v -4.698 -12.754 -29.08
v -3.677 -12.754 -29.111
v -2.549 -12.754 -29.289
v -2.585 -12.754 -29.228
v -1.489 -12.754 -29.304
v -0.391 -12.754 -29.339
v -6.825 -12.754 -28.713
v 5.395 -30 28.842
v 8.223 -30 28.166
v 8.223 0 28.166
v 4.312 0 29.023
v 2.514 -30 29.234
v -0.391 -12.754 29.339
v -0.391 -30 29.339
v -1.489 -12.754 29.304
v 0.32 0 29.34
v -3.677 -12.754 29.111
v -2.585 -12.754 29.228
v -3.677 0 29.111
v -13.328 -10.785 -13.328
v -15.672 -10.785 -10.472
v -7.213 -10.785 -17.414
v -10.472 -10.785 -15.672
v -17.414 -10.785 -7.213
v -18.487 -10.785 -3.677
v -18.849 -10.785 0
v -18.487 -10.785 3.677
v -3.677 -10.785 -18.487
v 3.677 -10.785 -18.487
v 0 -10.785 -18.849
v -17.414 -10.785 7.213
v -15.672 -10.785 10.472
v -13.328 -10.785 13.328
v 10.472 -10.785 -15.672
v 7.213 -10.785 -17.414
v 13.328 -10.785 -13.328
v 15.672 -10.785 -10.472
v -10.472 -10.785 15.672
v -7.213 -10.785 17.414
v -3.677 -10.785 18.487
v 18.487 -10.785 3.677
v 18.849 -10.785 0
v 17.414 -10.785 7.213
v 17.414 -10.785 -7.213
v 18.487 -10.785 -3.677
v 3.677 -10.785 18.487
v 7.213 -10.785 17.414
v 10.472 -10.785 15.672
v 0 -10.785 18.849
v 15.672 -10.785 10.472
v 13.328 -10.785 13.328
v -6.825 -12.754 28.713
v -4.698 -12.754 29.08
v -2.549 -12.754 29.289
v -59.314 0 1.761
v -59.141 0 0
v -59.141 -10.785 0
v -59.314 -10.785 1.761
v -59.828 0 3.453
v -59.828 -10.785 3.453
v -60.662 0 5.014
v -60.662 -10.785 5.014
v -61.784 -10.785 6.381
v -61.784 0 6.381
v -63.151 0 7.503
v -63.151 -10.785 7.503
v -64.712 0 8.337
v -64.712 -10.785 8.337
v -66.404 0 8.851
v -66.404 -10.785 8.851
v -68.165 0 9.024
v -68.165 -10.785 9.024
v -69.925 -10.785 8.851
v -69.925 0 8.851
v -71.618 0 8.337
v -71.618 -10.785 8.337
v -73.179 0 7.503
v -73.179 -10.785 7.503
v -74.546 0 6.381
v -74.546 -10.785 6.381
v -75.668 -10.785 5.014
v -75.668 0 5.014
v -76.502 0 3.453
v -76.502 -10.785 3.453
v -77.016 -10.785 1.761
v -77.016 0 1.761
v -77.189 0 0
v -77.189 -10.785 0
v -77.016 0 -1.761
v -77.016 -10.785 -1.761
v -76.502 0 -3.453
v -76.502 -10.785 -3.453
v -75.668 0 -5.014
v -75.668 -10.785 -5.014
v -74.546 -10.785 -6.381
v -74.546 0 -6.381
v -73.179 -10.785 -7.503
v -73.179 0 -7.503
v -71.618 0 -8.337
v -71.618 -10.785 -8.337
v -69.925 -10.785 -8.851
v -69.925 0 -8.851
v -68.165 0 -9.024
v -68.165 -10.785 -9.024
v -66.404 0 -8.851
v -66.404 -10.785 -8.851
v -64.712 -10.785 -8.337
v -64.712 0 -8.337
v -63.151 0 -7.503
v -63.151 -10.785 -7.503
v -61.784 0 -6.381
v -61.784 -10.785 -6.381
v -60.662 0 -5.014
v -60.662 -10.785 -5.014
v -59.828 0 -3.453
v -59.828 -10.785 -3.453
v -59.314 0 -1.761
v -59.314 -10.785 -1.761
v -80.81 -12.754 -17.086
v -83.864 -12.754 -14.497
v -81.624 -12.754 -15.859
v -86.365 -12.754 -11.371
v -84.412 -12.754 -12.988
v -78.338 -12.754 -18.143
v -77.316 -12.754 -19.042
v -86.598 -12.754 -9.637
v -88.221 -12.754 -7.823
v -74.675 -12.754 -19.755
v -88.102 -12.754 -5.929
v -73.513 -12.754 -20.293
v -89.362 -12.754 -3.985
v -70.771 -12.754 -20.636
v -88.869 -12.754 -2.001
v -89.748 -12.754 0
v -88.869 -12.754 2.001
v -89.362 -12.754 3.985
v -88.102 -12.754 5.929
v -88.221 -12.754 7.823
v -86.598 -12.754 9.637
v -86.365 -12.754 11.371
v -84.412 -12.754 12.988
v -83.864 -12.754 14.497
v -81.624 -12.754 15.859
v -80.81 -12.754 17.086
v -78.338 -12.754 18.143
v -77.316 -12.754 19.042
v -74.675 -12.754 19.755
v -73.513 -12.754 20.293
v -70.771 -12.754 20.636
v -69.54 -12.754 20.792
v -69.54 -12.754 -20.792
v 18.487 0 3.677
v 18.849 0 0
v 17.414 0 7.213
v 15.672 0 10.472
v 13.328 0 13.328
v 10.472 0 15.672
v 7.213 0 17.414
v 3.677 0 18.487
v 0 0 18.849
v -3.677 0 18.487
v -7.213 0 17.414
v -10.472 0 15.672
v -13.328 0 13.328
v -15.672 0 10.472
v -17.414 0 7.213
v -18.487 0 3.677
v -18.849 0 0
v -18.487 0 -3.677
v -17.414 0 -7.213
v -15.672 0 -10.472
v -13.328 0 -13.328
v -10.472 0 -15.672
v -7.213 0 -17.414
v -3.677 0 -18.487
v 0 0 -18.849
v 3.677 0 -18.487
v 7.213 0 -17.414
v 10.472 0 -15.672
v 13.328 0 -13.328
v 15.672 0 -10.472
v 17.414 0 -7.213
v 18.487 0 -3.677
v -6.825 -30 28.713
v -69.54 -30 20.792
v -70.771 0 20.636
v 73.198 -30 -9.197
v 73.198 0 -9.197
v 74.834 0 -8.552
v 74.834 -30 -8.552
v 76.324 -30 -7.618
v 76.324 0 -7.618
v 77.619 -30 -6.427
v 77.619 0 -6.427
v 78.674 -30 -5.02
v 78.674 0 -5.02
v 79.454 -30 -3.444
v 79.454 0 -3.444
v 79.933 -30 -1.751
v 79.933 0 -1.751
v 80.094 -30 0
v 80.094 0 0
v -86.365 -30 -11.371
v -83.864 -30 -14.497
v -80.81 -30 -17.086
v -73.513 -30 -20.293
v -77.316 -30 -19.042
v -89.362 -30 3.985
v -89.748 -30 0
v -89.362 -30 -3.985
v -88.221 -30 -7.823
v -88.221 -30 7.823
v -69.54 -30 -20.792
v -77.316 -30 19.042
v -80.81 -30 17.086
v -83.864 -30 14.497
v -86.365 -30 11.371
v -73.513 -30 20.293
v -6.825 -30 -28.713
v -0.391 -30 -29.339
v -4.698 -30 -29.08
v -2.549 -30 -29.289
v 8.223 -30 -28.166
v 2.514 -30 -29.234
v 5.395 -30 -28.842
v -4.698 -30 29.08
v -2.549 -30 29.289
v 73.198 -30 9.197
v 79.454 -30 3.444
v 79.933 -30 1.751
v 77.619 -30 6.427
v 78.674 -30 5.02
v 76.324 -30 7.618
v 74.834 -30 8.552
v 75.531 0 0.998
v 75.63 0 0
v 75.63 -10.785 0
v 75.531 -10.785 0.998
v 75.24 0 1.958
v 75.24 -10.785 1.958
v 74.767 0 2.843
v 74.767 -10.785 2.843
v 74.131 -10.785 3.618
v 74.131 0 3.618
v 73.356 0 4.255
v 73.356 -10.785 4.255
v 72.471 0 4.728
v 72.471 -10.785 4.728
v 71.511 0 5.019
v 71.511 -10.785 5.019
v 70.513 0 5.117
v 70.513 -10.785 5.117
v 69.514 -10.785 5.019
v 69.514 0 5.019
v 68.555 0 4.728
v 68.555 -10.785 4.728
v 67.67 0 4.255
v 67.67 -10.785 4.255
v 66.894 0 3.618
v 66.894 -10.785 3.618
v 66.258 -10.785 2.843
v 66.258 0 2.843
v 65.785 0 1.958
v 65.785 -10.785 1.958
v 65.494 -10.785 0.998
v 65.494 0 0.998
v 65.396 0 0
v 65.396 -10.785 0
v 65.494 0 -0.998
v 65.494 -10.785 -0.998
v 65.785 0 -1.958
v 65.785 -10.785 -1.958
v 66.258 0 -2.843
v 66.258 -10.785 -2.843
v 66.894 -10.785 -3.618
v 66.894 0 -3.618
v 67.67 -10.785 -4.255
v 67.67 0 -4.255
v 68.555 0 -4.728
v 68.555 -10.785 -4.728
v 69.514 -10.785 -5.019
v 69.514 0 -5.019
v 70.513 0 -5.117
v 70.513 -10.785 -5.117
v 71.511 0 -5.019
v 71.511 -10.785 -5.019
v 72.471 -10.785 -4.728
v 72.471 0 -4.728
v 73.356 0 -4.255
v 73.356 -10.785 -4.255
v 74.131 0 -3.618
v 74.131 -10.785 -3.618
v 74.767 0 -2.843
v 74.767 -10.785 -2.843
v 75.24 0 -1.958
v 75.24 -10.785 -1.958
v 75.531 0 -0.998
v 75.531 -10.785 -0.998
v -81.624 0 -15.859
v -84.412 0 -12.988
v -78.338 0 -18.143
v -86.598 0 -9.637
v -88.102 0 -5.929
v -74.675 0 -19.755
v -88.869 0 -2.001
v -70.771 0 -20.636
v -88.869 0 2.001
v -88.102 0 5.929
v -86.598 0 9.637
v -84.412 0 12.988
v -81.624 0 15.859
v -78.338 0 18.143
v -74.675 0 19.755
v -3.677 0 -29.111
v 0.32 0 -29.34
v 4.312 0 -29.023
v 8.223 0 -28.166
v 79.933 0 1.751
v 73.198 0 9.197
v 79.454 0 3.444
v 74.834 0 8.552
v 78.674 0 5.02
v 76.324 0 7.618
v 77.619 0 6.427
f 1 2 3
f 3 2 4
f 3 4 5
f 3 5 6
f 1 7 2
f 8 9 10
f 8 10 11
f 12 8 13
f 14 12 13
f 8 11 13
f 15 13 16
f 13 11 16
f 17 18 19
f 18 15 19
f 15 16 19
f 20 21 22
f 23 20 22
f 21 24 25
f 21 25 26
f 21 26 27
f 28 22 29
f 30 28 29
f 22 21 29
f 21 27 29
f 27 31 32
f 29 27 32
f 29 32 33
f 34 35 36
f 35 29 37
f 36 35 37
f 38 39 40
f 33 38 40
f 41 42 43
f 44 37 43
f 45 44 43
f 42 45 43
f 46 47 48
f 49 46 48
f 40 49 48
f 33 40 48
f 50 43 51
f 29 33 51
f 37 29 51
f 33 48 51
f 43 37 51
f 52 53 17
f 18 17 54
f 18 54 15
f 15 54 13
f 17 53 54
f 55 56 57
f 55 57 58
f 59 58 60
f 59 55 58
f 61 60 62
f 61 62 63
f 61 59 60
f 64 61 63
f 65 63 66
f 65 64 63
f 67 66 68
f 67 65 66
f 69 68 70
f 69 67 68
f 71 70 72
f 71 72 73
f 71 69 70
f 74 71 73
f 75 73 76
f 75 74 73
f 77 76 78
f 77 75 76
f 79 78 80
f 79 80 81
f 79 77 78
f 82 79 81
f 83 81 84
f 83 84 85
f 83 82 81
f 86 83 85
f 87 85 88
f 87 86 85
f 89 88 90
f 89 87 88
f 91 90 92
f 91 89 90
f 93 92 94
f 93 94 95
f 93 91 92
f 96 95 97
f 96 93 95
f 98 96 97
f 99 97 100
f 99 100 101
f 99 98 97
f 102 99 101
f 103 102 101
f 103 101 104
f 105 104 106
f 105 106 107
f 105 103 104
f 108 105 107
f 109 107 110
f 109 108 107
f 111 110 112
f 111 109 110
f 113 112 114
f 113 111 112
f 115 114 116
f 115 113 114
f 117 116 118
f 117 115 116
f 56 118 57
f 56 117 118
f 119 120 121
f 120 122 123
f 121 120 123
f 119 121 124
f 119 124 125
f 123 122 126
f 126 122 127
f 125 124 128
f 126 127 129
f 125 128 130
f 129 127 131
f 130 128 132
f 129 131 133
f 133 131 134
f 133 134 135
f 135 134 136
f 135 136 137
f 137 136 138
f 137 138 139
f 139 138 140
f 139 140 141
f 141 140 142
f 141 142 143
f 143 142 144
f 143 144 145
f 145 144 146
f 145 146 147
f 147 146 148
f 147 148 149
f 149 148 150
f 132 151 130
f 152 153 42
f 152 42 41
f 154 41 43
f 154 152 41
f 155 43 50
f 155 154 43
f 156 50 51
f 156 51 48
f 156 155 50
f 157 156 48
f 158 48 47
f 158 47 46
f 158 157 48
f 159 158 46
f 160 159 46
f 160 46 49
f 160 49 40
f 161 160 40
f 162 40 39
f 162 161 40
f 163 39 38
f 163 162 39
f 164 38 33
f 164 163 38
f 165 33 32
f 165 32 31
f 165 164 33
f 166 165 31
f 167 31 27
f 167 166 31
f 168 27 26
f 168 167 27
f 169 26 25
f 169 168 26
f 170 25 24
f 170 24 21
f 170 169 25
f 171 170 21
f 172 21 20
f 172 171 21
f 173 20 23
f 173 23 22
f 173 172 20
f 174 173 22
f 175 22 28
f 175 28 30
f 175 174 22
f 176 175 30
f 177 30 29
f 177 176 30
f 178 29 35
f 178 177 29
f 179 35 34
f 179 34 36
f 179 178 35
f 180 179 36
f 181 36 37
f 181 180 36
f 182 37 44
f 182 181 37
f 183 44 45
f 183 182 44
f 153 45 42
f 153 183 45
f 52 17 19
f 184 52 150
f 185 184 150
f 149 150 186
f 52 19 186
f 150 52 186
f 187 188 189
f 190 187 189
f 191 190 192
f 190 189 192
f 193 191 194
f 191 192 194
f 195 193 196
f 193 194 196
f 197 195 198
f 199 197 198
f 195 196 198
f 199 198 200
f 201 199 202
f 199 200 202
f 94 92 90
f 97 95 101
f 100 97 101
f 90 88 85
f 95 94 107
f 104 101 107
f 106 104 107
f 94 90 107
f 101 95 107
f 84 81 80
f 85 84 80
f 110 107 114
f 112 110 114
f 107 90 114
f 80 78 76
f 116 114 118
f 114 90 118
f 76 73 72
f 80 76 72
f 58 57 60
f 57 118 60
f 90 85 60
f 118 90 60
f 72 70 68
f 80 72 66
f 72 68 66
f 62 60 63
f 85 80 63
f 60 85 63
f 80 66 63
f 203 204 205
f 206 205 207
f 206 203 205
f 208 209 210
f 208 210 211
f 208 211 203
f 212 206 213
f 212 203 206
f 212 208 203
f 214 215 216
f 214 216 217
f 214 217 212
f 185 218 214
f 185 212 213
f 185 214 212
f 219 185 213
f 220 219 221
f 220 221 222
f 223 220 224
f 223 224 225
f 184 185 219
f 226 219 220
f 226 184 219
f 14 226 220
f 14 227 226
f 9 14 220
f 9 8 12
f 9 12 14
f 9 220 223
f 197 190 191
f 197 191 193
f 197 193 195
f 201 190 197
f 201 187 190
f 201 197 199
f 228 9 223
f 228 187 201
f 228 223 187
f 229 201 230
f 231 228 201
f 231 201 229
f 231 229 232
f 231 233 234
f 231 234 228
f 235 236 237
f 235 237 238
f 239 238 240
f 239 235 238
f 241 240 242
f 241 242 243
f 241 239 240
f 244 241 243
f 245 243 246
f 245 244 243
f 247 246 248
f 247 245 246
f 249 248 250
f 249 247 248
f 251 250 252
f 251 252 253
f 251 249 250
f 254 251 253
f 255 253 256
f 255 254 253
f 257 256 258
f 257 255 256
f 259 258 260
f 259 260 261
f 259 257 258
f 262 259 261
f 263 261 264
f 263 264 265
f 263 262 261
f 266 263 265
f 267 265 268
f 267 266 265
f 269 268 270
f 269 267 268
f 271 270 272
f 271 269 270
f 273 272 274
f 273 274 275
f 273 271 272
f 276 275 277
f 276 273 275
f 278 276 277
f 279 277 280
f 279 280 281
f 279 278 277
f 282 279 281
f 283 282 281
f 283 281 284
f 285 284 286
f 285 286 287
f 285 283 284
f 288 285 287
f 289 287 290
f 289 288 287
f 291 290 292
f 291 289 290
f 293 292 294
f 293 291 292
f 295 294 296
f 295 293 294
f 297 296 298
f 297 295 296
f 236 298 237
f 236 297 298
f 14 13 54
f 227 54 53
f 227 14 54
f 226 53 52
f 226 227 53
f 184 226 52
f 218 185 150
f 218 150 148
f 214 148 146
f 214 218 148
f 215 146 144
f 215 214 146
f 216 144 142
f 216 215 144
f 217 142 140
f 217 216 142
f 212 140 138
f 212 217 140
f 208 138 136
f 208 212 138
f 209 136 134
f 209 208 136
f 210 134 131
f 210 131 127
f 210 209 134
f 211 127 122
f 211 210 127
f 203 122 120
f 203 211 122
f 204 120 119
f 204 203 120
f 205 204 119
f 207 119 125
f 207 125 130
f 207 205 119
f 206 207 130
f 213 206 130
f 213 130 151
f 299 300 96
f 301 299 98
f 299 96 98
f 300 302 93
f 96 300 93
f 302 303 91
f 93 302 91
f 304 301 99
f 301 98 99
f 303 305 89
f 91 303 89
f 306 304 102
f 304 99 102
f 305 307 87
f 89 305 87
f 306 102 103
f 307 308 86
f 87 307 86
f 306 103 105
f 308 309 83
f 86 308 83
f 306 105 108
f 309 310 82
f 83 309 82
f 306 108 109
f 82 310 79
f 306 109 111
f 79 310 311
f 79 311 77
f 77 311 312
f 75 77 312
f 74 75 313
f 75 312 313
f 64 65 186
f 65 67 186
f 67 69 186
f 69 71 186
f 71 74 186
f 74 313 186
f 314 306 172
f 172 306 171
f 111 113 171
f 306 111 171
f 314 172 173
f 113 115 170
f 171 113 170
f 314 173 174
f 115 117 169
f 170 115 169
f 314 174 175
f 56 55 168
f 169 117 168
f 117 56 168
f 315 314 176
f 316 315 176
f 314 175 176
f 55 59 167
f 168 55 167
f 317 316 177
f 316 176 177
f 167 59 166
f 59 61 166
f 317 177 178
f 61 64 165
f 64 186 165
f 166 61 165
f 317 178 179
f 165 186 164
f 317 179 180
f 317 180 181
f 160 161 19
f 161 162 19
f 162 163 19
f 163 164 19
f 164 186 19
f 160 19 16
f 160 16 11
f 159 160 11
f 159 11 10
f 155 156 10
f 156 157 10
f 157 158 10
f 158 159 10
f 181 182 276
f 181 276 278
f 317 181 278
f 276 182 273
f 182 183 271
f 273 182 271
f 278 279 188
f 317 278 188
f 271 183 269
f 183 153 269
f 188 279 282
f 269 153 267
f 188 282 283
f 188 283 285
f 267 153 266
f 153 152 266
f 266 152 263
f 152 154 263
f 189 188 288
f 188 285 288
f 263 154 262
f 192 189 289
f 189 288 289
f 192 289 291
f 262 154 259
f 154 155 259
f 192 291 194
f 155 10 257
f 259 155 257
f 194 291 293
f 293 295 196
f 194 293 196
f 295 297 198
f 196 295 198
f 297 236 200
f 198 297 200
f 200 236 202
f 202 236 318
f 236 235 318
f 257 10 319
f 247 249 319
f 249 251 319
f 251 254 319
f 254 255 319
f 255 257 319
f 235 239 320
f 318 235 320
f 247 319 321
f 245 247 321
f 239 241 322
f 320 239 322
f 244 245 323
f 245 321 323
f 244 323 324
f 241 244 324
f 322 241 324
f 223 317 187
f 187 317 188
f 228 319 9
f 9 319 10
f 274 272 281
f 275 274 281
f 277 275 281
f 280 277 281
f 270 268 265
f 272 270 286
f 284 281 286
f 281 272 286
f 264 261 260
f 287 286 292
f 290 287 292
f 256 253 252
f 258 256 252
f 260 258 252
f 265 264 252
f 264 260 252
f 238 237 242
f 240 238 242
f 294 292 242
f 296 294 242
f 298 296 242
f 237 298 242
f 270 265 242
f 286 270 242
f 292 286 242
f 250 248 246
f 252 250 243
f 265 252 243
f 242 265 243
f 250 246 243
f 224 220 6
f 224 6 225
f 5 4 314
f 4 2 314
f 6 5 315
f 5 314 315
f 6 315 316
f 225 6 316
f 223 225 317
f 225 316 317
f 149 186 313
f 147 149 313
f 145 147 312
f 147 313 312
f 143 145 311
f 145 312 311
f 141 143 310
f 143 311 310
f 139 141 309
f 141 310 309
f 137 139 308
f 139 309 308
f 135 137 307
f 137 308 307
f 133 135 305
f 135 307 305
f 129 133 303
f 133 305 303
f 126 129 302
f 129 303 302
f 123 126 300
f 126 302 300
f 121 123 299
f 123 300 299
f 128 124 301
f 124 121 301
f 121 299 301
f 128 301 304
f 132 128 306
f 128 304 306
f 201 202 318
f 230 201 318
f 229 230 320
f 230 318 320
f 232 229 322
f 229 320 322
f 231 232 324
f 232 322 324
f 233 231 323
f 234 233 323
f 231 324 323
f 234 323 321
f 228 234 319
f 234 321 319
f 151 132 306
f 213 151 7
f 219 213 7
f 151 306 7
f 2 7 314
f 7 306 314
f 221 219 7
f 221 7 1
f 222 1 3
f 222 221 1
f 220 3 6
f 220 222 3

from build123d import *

# Parameters (mm, degrees)
F0_R     = 5.117058
F0_R_2   = 18.848799
F0_R_3   = 9.024126
F1_DEPTH = 30
F6_DEPTH = 10.785379
F2_R     = 20.800257
F2_R_2   = 29.342009
F2_R_3   = 9.581233
F3_DEPTH = 17.246447
F4_DEPTH = 0.934202


with BuildPart() as f1:
    # F0 (on Front) → F1 (new body)
    with BuildSketch(Plane.XZ):
        with BuildLine():
            ThreePointArc((8.222921, 28.166239), (23.475844, 17.602222), (29.342009, 0))
            ThreePointArc((29.342009, 0), (23.475844, -17.602222), (8.222921, -28.166239))
            Line((8.222921, -28.166239), (73.19784, -9.197302))
            ThreePointArc((73.19784, -9.197302), (60.931524, 0), (73.19784, 9.197302))
            Line((73.19784, 9.197302), (8.222921, 28.166239))
        make_face()
        with BuildLine():
            ThreePointArc((80.09399, 0), (78.178474, 5.747766), (73.19784, 9.197302))
            ThreePointArc((73.19784, 9.197302), (60.931524, 0), (73.19784, -9.197302))
            ThreePointArc((73.19784, -9.197302), (78.178474, -5.747766), (80.09399, 0))
        make_face()
        with Locations((70.512757, 0)):
            Circle(F0_R, mode=Mode.SUBTRACT)
        with Locations((70.512757, 0)):
            Circle(F0_R)
        with BuildLine():
            ThreePointArc((8.222921, -28.166239), (23.475844, -17.602222), (29.342009, 0))
            ThreePointArc((29.342009, 0), (23.475844, 17.602222), (8.222921, 28.166239))
            ThreePointArc((8.222921, 28.166239), (2.321575, 29.250022), (-3.676847, 29.110724))
            ThreePointArc((-3.676847, 29.110724), (-29.342009, 0), (-3.676847, -29.110724))
            ThreePointArc((-3.676847, -29.110724), (2.321575, -29.250022), (8.222921, -28.166239))
        make_face()
        Circle(F0_R_2, mode=Mode.SUBTRACT)
        Circle(F0_R_2)
        with BuildLine():
            ThreePointArc((-3.676847, -29.110724), (-29.342009, 0), (-3.676847, 29.110724))
            Line((-3.676847, 29.110724), (-70.771454, 20.636302))
            ThreePointArc((-70.771454, 20.636302), (-54.409335, 15.602342), (-47.364717, 0))
            ThreePointArc((-47.364717, 0), (-54.409335, -15.602342), (-70.771454, -20.636302))
            Line((-70.771454, -20.636302), (-3.676847, -29.110724))
        make_face()
        with BuildLine():
            ThreePointArc((-47.364717, 0), (-54.409335, 15.602342), (-70.771454, 20.636302))
            ThreePointArc((-70.771454, 20.636302), (-88.965232, 0), (-70.771454, -20.636302))
            ThreePointArc((-70.771454, -20.636302), (-54.409335, -15.602342), (-47.364717, 0))
        make_face()
        with Locations((-68.164974, 0)):
            Circle(F0_R_3, mode=Mode.SUBTRACT)
        with Locations((-68.164974, 0)):
            Circle(F0_R_3)
    extrude(amount=F1_DEPTH)

    # F0 (on Front) → F6 (cut)
    with BuildSketch(Plane.XZ):
        with Locations((-68.164974, 0)):
            Circle(F0_R_3)
        Circle(F0_R_2)
        with Locations((70.512757, 0)):
            Circle(F0_R)
    extrude(amount=F6_DEPTH, mode=Mode.SUBTRACT)

    # F2 (on offset) → F3 (join)
    with BuildSketch(Plane.XZ.offset(30)):
        with Locations((-68.947569, 0)):
            Circle(F2_R)
        with Locations((-0.782594, 0)):
            Circle(F2_R_2)
        with Locations((69.730163, 0)):
            Circle(F2_R_3)
    extrude(amount=-F3_DEPTH)

    # F0 (on Front) → F4 (cut)
    with BuildSketch(Plane.XZ):
        with BuildLine():
            ThreePointArc((-47.364717, 0), (-54.409335, 15.602342), (-70.771454, 20.636302))
            ThreePointArc((-70.771454, 20.636302), (-88.965232, 0), (-70.771454, -20.636302))
            ThreePointArc((-70.771454, -20.636302), (-54.409335, -15.602342), (-47.364717, 0))
        make_face()
        with Locations((-68.164974, 0)):
            Circle(F0_R_3, mode=Mode.SUBTRACT)
        with BuildLine():
            ThreePointArc((8.222921, -28.166239), (23.475844, -17.602222), (29.342009, 0))
            ThreePointArc((29.342009, 0), (23.475844, 17.602222), (8.222921, 28.166239))
            ThreePointArc((8.222921, 28.166239), (2.321575, 29.250022), (-3.676847, 29.110724))
            ThreePointArc((-3.676847, 29.110724), (-29.342009, 0), (-3.676847, -29.110724))
            ThreePointArc((-3.676847, -29.110724), (2.321575, -29.250022), (8.222921, -28.166239))
        make_face()
        Circle(F0_R_2, mode=Mode.SUBTRACT)
        with BuildLine():
            ThreePointArc((80.09399, 0), (78.178474, 5.747766), (73.19784, 9.197302))
            ThreePointArc((73.19784, 9.197302), (60.931524, 0), (73.19784, -9.197302))
            ThreePointArc((73.19784, -9.197302), (78.178474, -5.747766), (80.09399, 0))
        make_face()
        with Locations((70.512757, 0)):
            Circle(F0_R, mode=Mode.SUBTRACT)
    extrude(amount=-F4_DEPTH, mode=Mode.SUBTRACT)


solid = f1.part
